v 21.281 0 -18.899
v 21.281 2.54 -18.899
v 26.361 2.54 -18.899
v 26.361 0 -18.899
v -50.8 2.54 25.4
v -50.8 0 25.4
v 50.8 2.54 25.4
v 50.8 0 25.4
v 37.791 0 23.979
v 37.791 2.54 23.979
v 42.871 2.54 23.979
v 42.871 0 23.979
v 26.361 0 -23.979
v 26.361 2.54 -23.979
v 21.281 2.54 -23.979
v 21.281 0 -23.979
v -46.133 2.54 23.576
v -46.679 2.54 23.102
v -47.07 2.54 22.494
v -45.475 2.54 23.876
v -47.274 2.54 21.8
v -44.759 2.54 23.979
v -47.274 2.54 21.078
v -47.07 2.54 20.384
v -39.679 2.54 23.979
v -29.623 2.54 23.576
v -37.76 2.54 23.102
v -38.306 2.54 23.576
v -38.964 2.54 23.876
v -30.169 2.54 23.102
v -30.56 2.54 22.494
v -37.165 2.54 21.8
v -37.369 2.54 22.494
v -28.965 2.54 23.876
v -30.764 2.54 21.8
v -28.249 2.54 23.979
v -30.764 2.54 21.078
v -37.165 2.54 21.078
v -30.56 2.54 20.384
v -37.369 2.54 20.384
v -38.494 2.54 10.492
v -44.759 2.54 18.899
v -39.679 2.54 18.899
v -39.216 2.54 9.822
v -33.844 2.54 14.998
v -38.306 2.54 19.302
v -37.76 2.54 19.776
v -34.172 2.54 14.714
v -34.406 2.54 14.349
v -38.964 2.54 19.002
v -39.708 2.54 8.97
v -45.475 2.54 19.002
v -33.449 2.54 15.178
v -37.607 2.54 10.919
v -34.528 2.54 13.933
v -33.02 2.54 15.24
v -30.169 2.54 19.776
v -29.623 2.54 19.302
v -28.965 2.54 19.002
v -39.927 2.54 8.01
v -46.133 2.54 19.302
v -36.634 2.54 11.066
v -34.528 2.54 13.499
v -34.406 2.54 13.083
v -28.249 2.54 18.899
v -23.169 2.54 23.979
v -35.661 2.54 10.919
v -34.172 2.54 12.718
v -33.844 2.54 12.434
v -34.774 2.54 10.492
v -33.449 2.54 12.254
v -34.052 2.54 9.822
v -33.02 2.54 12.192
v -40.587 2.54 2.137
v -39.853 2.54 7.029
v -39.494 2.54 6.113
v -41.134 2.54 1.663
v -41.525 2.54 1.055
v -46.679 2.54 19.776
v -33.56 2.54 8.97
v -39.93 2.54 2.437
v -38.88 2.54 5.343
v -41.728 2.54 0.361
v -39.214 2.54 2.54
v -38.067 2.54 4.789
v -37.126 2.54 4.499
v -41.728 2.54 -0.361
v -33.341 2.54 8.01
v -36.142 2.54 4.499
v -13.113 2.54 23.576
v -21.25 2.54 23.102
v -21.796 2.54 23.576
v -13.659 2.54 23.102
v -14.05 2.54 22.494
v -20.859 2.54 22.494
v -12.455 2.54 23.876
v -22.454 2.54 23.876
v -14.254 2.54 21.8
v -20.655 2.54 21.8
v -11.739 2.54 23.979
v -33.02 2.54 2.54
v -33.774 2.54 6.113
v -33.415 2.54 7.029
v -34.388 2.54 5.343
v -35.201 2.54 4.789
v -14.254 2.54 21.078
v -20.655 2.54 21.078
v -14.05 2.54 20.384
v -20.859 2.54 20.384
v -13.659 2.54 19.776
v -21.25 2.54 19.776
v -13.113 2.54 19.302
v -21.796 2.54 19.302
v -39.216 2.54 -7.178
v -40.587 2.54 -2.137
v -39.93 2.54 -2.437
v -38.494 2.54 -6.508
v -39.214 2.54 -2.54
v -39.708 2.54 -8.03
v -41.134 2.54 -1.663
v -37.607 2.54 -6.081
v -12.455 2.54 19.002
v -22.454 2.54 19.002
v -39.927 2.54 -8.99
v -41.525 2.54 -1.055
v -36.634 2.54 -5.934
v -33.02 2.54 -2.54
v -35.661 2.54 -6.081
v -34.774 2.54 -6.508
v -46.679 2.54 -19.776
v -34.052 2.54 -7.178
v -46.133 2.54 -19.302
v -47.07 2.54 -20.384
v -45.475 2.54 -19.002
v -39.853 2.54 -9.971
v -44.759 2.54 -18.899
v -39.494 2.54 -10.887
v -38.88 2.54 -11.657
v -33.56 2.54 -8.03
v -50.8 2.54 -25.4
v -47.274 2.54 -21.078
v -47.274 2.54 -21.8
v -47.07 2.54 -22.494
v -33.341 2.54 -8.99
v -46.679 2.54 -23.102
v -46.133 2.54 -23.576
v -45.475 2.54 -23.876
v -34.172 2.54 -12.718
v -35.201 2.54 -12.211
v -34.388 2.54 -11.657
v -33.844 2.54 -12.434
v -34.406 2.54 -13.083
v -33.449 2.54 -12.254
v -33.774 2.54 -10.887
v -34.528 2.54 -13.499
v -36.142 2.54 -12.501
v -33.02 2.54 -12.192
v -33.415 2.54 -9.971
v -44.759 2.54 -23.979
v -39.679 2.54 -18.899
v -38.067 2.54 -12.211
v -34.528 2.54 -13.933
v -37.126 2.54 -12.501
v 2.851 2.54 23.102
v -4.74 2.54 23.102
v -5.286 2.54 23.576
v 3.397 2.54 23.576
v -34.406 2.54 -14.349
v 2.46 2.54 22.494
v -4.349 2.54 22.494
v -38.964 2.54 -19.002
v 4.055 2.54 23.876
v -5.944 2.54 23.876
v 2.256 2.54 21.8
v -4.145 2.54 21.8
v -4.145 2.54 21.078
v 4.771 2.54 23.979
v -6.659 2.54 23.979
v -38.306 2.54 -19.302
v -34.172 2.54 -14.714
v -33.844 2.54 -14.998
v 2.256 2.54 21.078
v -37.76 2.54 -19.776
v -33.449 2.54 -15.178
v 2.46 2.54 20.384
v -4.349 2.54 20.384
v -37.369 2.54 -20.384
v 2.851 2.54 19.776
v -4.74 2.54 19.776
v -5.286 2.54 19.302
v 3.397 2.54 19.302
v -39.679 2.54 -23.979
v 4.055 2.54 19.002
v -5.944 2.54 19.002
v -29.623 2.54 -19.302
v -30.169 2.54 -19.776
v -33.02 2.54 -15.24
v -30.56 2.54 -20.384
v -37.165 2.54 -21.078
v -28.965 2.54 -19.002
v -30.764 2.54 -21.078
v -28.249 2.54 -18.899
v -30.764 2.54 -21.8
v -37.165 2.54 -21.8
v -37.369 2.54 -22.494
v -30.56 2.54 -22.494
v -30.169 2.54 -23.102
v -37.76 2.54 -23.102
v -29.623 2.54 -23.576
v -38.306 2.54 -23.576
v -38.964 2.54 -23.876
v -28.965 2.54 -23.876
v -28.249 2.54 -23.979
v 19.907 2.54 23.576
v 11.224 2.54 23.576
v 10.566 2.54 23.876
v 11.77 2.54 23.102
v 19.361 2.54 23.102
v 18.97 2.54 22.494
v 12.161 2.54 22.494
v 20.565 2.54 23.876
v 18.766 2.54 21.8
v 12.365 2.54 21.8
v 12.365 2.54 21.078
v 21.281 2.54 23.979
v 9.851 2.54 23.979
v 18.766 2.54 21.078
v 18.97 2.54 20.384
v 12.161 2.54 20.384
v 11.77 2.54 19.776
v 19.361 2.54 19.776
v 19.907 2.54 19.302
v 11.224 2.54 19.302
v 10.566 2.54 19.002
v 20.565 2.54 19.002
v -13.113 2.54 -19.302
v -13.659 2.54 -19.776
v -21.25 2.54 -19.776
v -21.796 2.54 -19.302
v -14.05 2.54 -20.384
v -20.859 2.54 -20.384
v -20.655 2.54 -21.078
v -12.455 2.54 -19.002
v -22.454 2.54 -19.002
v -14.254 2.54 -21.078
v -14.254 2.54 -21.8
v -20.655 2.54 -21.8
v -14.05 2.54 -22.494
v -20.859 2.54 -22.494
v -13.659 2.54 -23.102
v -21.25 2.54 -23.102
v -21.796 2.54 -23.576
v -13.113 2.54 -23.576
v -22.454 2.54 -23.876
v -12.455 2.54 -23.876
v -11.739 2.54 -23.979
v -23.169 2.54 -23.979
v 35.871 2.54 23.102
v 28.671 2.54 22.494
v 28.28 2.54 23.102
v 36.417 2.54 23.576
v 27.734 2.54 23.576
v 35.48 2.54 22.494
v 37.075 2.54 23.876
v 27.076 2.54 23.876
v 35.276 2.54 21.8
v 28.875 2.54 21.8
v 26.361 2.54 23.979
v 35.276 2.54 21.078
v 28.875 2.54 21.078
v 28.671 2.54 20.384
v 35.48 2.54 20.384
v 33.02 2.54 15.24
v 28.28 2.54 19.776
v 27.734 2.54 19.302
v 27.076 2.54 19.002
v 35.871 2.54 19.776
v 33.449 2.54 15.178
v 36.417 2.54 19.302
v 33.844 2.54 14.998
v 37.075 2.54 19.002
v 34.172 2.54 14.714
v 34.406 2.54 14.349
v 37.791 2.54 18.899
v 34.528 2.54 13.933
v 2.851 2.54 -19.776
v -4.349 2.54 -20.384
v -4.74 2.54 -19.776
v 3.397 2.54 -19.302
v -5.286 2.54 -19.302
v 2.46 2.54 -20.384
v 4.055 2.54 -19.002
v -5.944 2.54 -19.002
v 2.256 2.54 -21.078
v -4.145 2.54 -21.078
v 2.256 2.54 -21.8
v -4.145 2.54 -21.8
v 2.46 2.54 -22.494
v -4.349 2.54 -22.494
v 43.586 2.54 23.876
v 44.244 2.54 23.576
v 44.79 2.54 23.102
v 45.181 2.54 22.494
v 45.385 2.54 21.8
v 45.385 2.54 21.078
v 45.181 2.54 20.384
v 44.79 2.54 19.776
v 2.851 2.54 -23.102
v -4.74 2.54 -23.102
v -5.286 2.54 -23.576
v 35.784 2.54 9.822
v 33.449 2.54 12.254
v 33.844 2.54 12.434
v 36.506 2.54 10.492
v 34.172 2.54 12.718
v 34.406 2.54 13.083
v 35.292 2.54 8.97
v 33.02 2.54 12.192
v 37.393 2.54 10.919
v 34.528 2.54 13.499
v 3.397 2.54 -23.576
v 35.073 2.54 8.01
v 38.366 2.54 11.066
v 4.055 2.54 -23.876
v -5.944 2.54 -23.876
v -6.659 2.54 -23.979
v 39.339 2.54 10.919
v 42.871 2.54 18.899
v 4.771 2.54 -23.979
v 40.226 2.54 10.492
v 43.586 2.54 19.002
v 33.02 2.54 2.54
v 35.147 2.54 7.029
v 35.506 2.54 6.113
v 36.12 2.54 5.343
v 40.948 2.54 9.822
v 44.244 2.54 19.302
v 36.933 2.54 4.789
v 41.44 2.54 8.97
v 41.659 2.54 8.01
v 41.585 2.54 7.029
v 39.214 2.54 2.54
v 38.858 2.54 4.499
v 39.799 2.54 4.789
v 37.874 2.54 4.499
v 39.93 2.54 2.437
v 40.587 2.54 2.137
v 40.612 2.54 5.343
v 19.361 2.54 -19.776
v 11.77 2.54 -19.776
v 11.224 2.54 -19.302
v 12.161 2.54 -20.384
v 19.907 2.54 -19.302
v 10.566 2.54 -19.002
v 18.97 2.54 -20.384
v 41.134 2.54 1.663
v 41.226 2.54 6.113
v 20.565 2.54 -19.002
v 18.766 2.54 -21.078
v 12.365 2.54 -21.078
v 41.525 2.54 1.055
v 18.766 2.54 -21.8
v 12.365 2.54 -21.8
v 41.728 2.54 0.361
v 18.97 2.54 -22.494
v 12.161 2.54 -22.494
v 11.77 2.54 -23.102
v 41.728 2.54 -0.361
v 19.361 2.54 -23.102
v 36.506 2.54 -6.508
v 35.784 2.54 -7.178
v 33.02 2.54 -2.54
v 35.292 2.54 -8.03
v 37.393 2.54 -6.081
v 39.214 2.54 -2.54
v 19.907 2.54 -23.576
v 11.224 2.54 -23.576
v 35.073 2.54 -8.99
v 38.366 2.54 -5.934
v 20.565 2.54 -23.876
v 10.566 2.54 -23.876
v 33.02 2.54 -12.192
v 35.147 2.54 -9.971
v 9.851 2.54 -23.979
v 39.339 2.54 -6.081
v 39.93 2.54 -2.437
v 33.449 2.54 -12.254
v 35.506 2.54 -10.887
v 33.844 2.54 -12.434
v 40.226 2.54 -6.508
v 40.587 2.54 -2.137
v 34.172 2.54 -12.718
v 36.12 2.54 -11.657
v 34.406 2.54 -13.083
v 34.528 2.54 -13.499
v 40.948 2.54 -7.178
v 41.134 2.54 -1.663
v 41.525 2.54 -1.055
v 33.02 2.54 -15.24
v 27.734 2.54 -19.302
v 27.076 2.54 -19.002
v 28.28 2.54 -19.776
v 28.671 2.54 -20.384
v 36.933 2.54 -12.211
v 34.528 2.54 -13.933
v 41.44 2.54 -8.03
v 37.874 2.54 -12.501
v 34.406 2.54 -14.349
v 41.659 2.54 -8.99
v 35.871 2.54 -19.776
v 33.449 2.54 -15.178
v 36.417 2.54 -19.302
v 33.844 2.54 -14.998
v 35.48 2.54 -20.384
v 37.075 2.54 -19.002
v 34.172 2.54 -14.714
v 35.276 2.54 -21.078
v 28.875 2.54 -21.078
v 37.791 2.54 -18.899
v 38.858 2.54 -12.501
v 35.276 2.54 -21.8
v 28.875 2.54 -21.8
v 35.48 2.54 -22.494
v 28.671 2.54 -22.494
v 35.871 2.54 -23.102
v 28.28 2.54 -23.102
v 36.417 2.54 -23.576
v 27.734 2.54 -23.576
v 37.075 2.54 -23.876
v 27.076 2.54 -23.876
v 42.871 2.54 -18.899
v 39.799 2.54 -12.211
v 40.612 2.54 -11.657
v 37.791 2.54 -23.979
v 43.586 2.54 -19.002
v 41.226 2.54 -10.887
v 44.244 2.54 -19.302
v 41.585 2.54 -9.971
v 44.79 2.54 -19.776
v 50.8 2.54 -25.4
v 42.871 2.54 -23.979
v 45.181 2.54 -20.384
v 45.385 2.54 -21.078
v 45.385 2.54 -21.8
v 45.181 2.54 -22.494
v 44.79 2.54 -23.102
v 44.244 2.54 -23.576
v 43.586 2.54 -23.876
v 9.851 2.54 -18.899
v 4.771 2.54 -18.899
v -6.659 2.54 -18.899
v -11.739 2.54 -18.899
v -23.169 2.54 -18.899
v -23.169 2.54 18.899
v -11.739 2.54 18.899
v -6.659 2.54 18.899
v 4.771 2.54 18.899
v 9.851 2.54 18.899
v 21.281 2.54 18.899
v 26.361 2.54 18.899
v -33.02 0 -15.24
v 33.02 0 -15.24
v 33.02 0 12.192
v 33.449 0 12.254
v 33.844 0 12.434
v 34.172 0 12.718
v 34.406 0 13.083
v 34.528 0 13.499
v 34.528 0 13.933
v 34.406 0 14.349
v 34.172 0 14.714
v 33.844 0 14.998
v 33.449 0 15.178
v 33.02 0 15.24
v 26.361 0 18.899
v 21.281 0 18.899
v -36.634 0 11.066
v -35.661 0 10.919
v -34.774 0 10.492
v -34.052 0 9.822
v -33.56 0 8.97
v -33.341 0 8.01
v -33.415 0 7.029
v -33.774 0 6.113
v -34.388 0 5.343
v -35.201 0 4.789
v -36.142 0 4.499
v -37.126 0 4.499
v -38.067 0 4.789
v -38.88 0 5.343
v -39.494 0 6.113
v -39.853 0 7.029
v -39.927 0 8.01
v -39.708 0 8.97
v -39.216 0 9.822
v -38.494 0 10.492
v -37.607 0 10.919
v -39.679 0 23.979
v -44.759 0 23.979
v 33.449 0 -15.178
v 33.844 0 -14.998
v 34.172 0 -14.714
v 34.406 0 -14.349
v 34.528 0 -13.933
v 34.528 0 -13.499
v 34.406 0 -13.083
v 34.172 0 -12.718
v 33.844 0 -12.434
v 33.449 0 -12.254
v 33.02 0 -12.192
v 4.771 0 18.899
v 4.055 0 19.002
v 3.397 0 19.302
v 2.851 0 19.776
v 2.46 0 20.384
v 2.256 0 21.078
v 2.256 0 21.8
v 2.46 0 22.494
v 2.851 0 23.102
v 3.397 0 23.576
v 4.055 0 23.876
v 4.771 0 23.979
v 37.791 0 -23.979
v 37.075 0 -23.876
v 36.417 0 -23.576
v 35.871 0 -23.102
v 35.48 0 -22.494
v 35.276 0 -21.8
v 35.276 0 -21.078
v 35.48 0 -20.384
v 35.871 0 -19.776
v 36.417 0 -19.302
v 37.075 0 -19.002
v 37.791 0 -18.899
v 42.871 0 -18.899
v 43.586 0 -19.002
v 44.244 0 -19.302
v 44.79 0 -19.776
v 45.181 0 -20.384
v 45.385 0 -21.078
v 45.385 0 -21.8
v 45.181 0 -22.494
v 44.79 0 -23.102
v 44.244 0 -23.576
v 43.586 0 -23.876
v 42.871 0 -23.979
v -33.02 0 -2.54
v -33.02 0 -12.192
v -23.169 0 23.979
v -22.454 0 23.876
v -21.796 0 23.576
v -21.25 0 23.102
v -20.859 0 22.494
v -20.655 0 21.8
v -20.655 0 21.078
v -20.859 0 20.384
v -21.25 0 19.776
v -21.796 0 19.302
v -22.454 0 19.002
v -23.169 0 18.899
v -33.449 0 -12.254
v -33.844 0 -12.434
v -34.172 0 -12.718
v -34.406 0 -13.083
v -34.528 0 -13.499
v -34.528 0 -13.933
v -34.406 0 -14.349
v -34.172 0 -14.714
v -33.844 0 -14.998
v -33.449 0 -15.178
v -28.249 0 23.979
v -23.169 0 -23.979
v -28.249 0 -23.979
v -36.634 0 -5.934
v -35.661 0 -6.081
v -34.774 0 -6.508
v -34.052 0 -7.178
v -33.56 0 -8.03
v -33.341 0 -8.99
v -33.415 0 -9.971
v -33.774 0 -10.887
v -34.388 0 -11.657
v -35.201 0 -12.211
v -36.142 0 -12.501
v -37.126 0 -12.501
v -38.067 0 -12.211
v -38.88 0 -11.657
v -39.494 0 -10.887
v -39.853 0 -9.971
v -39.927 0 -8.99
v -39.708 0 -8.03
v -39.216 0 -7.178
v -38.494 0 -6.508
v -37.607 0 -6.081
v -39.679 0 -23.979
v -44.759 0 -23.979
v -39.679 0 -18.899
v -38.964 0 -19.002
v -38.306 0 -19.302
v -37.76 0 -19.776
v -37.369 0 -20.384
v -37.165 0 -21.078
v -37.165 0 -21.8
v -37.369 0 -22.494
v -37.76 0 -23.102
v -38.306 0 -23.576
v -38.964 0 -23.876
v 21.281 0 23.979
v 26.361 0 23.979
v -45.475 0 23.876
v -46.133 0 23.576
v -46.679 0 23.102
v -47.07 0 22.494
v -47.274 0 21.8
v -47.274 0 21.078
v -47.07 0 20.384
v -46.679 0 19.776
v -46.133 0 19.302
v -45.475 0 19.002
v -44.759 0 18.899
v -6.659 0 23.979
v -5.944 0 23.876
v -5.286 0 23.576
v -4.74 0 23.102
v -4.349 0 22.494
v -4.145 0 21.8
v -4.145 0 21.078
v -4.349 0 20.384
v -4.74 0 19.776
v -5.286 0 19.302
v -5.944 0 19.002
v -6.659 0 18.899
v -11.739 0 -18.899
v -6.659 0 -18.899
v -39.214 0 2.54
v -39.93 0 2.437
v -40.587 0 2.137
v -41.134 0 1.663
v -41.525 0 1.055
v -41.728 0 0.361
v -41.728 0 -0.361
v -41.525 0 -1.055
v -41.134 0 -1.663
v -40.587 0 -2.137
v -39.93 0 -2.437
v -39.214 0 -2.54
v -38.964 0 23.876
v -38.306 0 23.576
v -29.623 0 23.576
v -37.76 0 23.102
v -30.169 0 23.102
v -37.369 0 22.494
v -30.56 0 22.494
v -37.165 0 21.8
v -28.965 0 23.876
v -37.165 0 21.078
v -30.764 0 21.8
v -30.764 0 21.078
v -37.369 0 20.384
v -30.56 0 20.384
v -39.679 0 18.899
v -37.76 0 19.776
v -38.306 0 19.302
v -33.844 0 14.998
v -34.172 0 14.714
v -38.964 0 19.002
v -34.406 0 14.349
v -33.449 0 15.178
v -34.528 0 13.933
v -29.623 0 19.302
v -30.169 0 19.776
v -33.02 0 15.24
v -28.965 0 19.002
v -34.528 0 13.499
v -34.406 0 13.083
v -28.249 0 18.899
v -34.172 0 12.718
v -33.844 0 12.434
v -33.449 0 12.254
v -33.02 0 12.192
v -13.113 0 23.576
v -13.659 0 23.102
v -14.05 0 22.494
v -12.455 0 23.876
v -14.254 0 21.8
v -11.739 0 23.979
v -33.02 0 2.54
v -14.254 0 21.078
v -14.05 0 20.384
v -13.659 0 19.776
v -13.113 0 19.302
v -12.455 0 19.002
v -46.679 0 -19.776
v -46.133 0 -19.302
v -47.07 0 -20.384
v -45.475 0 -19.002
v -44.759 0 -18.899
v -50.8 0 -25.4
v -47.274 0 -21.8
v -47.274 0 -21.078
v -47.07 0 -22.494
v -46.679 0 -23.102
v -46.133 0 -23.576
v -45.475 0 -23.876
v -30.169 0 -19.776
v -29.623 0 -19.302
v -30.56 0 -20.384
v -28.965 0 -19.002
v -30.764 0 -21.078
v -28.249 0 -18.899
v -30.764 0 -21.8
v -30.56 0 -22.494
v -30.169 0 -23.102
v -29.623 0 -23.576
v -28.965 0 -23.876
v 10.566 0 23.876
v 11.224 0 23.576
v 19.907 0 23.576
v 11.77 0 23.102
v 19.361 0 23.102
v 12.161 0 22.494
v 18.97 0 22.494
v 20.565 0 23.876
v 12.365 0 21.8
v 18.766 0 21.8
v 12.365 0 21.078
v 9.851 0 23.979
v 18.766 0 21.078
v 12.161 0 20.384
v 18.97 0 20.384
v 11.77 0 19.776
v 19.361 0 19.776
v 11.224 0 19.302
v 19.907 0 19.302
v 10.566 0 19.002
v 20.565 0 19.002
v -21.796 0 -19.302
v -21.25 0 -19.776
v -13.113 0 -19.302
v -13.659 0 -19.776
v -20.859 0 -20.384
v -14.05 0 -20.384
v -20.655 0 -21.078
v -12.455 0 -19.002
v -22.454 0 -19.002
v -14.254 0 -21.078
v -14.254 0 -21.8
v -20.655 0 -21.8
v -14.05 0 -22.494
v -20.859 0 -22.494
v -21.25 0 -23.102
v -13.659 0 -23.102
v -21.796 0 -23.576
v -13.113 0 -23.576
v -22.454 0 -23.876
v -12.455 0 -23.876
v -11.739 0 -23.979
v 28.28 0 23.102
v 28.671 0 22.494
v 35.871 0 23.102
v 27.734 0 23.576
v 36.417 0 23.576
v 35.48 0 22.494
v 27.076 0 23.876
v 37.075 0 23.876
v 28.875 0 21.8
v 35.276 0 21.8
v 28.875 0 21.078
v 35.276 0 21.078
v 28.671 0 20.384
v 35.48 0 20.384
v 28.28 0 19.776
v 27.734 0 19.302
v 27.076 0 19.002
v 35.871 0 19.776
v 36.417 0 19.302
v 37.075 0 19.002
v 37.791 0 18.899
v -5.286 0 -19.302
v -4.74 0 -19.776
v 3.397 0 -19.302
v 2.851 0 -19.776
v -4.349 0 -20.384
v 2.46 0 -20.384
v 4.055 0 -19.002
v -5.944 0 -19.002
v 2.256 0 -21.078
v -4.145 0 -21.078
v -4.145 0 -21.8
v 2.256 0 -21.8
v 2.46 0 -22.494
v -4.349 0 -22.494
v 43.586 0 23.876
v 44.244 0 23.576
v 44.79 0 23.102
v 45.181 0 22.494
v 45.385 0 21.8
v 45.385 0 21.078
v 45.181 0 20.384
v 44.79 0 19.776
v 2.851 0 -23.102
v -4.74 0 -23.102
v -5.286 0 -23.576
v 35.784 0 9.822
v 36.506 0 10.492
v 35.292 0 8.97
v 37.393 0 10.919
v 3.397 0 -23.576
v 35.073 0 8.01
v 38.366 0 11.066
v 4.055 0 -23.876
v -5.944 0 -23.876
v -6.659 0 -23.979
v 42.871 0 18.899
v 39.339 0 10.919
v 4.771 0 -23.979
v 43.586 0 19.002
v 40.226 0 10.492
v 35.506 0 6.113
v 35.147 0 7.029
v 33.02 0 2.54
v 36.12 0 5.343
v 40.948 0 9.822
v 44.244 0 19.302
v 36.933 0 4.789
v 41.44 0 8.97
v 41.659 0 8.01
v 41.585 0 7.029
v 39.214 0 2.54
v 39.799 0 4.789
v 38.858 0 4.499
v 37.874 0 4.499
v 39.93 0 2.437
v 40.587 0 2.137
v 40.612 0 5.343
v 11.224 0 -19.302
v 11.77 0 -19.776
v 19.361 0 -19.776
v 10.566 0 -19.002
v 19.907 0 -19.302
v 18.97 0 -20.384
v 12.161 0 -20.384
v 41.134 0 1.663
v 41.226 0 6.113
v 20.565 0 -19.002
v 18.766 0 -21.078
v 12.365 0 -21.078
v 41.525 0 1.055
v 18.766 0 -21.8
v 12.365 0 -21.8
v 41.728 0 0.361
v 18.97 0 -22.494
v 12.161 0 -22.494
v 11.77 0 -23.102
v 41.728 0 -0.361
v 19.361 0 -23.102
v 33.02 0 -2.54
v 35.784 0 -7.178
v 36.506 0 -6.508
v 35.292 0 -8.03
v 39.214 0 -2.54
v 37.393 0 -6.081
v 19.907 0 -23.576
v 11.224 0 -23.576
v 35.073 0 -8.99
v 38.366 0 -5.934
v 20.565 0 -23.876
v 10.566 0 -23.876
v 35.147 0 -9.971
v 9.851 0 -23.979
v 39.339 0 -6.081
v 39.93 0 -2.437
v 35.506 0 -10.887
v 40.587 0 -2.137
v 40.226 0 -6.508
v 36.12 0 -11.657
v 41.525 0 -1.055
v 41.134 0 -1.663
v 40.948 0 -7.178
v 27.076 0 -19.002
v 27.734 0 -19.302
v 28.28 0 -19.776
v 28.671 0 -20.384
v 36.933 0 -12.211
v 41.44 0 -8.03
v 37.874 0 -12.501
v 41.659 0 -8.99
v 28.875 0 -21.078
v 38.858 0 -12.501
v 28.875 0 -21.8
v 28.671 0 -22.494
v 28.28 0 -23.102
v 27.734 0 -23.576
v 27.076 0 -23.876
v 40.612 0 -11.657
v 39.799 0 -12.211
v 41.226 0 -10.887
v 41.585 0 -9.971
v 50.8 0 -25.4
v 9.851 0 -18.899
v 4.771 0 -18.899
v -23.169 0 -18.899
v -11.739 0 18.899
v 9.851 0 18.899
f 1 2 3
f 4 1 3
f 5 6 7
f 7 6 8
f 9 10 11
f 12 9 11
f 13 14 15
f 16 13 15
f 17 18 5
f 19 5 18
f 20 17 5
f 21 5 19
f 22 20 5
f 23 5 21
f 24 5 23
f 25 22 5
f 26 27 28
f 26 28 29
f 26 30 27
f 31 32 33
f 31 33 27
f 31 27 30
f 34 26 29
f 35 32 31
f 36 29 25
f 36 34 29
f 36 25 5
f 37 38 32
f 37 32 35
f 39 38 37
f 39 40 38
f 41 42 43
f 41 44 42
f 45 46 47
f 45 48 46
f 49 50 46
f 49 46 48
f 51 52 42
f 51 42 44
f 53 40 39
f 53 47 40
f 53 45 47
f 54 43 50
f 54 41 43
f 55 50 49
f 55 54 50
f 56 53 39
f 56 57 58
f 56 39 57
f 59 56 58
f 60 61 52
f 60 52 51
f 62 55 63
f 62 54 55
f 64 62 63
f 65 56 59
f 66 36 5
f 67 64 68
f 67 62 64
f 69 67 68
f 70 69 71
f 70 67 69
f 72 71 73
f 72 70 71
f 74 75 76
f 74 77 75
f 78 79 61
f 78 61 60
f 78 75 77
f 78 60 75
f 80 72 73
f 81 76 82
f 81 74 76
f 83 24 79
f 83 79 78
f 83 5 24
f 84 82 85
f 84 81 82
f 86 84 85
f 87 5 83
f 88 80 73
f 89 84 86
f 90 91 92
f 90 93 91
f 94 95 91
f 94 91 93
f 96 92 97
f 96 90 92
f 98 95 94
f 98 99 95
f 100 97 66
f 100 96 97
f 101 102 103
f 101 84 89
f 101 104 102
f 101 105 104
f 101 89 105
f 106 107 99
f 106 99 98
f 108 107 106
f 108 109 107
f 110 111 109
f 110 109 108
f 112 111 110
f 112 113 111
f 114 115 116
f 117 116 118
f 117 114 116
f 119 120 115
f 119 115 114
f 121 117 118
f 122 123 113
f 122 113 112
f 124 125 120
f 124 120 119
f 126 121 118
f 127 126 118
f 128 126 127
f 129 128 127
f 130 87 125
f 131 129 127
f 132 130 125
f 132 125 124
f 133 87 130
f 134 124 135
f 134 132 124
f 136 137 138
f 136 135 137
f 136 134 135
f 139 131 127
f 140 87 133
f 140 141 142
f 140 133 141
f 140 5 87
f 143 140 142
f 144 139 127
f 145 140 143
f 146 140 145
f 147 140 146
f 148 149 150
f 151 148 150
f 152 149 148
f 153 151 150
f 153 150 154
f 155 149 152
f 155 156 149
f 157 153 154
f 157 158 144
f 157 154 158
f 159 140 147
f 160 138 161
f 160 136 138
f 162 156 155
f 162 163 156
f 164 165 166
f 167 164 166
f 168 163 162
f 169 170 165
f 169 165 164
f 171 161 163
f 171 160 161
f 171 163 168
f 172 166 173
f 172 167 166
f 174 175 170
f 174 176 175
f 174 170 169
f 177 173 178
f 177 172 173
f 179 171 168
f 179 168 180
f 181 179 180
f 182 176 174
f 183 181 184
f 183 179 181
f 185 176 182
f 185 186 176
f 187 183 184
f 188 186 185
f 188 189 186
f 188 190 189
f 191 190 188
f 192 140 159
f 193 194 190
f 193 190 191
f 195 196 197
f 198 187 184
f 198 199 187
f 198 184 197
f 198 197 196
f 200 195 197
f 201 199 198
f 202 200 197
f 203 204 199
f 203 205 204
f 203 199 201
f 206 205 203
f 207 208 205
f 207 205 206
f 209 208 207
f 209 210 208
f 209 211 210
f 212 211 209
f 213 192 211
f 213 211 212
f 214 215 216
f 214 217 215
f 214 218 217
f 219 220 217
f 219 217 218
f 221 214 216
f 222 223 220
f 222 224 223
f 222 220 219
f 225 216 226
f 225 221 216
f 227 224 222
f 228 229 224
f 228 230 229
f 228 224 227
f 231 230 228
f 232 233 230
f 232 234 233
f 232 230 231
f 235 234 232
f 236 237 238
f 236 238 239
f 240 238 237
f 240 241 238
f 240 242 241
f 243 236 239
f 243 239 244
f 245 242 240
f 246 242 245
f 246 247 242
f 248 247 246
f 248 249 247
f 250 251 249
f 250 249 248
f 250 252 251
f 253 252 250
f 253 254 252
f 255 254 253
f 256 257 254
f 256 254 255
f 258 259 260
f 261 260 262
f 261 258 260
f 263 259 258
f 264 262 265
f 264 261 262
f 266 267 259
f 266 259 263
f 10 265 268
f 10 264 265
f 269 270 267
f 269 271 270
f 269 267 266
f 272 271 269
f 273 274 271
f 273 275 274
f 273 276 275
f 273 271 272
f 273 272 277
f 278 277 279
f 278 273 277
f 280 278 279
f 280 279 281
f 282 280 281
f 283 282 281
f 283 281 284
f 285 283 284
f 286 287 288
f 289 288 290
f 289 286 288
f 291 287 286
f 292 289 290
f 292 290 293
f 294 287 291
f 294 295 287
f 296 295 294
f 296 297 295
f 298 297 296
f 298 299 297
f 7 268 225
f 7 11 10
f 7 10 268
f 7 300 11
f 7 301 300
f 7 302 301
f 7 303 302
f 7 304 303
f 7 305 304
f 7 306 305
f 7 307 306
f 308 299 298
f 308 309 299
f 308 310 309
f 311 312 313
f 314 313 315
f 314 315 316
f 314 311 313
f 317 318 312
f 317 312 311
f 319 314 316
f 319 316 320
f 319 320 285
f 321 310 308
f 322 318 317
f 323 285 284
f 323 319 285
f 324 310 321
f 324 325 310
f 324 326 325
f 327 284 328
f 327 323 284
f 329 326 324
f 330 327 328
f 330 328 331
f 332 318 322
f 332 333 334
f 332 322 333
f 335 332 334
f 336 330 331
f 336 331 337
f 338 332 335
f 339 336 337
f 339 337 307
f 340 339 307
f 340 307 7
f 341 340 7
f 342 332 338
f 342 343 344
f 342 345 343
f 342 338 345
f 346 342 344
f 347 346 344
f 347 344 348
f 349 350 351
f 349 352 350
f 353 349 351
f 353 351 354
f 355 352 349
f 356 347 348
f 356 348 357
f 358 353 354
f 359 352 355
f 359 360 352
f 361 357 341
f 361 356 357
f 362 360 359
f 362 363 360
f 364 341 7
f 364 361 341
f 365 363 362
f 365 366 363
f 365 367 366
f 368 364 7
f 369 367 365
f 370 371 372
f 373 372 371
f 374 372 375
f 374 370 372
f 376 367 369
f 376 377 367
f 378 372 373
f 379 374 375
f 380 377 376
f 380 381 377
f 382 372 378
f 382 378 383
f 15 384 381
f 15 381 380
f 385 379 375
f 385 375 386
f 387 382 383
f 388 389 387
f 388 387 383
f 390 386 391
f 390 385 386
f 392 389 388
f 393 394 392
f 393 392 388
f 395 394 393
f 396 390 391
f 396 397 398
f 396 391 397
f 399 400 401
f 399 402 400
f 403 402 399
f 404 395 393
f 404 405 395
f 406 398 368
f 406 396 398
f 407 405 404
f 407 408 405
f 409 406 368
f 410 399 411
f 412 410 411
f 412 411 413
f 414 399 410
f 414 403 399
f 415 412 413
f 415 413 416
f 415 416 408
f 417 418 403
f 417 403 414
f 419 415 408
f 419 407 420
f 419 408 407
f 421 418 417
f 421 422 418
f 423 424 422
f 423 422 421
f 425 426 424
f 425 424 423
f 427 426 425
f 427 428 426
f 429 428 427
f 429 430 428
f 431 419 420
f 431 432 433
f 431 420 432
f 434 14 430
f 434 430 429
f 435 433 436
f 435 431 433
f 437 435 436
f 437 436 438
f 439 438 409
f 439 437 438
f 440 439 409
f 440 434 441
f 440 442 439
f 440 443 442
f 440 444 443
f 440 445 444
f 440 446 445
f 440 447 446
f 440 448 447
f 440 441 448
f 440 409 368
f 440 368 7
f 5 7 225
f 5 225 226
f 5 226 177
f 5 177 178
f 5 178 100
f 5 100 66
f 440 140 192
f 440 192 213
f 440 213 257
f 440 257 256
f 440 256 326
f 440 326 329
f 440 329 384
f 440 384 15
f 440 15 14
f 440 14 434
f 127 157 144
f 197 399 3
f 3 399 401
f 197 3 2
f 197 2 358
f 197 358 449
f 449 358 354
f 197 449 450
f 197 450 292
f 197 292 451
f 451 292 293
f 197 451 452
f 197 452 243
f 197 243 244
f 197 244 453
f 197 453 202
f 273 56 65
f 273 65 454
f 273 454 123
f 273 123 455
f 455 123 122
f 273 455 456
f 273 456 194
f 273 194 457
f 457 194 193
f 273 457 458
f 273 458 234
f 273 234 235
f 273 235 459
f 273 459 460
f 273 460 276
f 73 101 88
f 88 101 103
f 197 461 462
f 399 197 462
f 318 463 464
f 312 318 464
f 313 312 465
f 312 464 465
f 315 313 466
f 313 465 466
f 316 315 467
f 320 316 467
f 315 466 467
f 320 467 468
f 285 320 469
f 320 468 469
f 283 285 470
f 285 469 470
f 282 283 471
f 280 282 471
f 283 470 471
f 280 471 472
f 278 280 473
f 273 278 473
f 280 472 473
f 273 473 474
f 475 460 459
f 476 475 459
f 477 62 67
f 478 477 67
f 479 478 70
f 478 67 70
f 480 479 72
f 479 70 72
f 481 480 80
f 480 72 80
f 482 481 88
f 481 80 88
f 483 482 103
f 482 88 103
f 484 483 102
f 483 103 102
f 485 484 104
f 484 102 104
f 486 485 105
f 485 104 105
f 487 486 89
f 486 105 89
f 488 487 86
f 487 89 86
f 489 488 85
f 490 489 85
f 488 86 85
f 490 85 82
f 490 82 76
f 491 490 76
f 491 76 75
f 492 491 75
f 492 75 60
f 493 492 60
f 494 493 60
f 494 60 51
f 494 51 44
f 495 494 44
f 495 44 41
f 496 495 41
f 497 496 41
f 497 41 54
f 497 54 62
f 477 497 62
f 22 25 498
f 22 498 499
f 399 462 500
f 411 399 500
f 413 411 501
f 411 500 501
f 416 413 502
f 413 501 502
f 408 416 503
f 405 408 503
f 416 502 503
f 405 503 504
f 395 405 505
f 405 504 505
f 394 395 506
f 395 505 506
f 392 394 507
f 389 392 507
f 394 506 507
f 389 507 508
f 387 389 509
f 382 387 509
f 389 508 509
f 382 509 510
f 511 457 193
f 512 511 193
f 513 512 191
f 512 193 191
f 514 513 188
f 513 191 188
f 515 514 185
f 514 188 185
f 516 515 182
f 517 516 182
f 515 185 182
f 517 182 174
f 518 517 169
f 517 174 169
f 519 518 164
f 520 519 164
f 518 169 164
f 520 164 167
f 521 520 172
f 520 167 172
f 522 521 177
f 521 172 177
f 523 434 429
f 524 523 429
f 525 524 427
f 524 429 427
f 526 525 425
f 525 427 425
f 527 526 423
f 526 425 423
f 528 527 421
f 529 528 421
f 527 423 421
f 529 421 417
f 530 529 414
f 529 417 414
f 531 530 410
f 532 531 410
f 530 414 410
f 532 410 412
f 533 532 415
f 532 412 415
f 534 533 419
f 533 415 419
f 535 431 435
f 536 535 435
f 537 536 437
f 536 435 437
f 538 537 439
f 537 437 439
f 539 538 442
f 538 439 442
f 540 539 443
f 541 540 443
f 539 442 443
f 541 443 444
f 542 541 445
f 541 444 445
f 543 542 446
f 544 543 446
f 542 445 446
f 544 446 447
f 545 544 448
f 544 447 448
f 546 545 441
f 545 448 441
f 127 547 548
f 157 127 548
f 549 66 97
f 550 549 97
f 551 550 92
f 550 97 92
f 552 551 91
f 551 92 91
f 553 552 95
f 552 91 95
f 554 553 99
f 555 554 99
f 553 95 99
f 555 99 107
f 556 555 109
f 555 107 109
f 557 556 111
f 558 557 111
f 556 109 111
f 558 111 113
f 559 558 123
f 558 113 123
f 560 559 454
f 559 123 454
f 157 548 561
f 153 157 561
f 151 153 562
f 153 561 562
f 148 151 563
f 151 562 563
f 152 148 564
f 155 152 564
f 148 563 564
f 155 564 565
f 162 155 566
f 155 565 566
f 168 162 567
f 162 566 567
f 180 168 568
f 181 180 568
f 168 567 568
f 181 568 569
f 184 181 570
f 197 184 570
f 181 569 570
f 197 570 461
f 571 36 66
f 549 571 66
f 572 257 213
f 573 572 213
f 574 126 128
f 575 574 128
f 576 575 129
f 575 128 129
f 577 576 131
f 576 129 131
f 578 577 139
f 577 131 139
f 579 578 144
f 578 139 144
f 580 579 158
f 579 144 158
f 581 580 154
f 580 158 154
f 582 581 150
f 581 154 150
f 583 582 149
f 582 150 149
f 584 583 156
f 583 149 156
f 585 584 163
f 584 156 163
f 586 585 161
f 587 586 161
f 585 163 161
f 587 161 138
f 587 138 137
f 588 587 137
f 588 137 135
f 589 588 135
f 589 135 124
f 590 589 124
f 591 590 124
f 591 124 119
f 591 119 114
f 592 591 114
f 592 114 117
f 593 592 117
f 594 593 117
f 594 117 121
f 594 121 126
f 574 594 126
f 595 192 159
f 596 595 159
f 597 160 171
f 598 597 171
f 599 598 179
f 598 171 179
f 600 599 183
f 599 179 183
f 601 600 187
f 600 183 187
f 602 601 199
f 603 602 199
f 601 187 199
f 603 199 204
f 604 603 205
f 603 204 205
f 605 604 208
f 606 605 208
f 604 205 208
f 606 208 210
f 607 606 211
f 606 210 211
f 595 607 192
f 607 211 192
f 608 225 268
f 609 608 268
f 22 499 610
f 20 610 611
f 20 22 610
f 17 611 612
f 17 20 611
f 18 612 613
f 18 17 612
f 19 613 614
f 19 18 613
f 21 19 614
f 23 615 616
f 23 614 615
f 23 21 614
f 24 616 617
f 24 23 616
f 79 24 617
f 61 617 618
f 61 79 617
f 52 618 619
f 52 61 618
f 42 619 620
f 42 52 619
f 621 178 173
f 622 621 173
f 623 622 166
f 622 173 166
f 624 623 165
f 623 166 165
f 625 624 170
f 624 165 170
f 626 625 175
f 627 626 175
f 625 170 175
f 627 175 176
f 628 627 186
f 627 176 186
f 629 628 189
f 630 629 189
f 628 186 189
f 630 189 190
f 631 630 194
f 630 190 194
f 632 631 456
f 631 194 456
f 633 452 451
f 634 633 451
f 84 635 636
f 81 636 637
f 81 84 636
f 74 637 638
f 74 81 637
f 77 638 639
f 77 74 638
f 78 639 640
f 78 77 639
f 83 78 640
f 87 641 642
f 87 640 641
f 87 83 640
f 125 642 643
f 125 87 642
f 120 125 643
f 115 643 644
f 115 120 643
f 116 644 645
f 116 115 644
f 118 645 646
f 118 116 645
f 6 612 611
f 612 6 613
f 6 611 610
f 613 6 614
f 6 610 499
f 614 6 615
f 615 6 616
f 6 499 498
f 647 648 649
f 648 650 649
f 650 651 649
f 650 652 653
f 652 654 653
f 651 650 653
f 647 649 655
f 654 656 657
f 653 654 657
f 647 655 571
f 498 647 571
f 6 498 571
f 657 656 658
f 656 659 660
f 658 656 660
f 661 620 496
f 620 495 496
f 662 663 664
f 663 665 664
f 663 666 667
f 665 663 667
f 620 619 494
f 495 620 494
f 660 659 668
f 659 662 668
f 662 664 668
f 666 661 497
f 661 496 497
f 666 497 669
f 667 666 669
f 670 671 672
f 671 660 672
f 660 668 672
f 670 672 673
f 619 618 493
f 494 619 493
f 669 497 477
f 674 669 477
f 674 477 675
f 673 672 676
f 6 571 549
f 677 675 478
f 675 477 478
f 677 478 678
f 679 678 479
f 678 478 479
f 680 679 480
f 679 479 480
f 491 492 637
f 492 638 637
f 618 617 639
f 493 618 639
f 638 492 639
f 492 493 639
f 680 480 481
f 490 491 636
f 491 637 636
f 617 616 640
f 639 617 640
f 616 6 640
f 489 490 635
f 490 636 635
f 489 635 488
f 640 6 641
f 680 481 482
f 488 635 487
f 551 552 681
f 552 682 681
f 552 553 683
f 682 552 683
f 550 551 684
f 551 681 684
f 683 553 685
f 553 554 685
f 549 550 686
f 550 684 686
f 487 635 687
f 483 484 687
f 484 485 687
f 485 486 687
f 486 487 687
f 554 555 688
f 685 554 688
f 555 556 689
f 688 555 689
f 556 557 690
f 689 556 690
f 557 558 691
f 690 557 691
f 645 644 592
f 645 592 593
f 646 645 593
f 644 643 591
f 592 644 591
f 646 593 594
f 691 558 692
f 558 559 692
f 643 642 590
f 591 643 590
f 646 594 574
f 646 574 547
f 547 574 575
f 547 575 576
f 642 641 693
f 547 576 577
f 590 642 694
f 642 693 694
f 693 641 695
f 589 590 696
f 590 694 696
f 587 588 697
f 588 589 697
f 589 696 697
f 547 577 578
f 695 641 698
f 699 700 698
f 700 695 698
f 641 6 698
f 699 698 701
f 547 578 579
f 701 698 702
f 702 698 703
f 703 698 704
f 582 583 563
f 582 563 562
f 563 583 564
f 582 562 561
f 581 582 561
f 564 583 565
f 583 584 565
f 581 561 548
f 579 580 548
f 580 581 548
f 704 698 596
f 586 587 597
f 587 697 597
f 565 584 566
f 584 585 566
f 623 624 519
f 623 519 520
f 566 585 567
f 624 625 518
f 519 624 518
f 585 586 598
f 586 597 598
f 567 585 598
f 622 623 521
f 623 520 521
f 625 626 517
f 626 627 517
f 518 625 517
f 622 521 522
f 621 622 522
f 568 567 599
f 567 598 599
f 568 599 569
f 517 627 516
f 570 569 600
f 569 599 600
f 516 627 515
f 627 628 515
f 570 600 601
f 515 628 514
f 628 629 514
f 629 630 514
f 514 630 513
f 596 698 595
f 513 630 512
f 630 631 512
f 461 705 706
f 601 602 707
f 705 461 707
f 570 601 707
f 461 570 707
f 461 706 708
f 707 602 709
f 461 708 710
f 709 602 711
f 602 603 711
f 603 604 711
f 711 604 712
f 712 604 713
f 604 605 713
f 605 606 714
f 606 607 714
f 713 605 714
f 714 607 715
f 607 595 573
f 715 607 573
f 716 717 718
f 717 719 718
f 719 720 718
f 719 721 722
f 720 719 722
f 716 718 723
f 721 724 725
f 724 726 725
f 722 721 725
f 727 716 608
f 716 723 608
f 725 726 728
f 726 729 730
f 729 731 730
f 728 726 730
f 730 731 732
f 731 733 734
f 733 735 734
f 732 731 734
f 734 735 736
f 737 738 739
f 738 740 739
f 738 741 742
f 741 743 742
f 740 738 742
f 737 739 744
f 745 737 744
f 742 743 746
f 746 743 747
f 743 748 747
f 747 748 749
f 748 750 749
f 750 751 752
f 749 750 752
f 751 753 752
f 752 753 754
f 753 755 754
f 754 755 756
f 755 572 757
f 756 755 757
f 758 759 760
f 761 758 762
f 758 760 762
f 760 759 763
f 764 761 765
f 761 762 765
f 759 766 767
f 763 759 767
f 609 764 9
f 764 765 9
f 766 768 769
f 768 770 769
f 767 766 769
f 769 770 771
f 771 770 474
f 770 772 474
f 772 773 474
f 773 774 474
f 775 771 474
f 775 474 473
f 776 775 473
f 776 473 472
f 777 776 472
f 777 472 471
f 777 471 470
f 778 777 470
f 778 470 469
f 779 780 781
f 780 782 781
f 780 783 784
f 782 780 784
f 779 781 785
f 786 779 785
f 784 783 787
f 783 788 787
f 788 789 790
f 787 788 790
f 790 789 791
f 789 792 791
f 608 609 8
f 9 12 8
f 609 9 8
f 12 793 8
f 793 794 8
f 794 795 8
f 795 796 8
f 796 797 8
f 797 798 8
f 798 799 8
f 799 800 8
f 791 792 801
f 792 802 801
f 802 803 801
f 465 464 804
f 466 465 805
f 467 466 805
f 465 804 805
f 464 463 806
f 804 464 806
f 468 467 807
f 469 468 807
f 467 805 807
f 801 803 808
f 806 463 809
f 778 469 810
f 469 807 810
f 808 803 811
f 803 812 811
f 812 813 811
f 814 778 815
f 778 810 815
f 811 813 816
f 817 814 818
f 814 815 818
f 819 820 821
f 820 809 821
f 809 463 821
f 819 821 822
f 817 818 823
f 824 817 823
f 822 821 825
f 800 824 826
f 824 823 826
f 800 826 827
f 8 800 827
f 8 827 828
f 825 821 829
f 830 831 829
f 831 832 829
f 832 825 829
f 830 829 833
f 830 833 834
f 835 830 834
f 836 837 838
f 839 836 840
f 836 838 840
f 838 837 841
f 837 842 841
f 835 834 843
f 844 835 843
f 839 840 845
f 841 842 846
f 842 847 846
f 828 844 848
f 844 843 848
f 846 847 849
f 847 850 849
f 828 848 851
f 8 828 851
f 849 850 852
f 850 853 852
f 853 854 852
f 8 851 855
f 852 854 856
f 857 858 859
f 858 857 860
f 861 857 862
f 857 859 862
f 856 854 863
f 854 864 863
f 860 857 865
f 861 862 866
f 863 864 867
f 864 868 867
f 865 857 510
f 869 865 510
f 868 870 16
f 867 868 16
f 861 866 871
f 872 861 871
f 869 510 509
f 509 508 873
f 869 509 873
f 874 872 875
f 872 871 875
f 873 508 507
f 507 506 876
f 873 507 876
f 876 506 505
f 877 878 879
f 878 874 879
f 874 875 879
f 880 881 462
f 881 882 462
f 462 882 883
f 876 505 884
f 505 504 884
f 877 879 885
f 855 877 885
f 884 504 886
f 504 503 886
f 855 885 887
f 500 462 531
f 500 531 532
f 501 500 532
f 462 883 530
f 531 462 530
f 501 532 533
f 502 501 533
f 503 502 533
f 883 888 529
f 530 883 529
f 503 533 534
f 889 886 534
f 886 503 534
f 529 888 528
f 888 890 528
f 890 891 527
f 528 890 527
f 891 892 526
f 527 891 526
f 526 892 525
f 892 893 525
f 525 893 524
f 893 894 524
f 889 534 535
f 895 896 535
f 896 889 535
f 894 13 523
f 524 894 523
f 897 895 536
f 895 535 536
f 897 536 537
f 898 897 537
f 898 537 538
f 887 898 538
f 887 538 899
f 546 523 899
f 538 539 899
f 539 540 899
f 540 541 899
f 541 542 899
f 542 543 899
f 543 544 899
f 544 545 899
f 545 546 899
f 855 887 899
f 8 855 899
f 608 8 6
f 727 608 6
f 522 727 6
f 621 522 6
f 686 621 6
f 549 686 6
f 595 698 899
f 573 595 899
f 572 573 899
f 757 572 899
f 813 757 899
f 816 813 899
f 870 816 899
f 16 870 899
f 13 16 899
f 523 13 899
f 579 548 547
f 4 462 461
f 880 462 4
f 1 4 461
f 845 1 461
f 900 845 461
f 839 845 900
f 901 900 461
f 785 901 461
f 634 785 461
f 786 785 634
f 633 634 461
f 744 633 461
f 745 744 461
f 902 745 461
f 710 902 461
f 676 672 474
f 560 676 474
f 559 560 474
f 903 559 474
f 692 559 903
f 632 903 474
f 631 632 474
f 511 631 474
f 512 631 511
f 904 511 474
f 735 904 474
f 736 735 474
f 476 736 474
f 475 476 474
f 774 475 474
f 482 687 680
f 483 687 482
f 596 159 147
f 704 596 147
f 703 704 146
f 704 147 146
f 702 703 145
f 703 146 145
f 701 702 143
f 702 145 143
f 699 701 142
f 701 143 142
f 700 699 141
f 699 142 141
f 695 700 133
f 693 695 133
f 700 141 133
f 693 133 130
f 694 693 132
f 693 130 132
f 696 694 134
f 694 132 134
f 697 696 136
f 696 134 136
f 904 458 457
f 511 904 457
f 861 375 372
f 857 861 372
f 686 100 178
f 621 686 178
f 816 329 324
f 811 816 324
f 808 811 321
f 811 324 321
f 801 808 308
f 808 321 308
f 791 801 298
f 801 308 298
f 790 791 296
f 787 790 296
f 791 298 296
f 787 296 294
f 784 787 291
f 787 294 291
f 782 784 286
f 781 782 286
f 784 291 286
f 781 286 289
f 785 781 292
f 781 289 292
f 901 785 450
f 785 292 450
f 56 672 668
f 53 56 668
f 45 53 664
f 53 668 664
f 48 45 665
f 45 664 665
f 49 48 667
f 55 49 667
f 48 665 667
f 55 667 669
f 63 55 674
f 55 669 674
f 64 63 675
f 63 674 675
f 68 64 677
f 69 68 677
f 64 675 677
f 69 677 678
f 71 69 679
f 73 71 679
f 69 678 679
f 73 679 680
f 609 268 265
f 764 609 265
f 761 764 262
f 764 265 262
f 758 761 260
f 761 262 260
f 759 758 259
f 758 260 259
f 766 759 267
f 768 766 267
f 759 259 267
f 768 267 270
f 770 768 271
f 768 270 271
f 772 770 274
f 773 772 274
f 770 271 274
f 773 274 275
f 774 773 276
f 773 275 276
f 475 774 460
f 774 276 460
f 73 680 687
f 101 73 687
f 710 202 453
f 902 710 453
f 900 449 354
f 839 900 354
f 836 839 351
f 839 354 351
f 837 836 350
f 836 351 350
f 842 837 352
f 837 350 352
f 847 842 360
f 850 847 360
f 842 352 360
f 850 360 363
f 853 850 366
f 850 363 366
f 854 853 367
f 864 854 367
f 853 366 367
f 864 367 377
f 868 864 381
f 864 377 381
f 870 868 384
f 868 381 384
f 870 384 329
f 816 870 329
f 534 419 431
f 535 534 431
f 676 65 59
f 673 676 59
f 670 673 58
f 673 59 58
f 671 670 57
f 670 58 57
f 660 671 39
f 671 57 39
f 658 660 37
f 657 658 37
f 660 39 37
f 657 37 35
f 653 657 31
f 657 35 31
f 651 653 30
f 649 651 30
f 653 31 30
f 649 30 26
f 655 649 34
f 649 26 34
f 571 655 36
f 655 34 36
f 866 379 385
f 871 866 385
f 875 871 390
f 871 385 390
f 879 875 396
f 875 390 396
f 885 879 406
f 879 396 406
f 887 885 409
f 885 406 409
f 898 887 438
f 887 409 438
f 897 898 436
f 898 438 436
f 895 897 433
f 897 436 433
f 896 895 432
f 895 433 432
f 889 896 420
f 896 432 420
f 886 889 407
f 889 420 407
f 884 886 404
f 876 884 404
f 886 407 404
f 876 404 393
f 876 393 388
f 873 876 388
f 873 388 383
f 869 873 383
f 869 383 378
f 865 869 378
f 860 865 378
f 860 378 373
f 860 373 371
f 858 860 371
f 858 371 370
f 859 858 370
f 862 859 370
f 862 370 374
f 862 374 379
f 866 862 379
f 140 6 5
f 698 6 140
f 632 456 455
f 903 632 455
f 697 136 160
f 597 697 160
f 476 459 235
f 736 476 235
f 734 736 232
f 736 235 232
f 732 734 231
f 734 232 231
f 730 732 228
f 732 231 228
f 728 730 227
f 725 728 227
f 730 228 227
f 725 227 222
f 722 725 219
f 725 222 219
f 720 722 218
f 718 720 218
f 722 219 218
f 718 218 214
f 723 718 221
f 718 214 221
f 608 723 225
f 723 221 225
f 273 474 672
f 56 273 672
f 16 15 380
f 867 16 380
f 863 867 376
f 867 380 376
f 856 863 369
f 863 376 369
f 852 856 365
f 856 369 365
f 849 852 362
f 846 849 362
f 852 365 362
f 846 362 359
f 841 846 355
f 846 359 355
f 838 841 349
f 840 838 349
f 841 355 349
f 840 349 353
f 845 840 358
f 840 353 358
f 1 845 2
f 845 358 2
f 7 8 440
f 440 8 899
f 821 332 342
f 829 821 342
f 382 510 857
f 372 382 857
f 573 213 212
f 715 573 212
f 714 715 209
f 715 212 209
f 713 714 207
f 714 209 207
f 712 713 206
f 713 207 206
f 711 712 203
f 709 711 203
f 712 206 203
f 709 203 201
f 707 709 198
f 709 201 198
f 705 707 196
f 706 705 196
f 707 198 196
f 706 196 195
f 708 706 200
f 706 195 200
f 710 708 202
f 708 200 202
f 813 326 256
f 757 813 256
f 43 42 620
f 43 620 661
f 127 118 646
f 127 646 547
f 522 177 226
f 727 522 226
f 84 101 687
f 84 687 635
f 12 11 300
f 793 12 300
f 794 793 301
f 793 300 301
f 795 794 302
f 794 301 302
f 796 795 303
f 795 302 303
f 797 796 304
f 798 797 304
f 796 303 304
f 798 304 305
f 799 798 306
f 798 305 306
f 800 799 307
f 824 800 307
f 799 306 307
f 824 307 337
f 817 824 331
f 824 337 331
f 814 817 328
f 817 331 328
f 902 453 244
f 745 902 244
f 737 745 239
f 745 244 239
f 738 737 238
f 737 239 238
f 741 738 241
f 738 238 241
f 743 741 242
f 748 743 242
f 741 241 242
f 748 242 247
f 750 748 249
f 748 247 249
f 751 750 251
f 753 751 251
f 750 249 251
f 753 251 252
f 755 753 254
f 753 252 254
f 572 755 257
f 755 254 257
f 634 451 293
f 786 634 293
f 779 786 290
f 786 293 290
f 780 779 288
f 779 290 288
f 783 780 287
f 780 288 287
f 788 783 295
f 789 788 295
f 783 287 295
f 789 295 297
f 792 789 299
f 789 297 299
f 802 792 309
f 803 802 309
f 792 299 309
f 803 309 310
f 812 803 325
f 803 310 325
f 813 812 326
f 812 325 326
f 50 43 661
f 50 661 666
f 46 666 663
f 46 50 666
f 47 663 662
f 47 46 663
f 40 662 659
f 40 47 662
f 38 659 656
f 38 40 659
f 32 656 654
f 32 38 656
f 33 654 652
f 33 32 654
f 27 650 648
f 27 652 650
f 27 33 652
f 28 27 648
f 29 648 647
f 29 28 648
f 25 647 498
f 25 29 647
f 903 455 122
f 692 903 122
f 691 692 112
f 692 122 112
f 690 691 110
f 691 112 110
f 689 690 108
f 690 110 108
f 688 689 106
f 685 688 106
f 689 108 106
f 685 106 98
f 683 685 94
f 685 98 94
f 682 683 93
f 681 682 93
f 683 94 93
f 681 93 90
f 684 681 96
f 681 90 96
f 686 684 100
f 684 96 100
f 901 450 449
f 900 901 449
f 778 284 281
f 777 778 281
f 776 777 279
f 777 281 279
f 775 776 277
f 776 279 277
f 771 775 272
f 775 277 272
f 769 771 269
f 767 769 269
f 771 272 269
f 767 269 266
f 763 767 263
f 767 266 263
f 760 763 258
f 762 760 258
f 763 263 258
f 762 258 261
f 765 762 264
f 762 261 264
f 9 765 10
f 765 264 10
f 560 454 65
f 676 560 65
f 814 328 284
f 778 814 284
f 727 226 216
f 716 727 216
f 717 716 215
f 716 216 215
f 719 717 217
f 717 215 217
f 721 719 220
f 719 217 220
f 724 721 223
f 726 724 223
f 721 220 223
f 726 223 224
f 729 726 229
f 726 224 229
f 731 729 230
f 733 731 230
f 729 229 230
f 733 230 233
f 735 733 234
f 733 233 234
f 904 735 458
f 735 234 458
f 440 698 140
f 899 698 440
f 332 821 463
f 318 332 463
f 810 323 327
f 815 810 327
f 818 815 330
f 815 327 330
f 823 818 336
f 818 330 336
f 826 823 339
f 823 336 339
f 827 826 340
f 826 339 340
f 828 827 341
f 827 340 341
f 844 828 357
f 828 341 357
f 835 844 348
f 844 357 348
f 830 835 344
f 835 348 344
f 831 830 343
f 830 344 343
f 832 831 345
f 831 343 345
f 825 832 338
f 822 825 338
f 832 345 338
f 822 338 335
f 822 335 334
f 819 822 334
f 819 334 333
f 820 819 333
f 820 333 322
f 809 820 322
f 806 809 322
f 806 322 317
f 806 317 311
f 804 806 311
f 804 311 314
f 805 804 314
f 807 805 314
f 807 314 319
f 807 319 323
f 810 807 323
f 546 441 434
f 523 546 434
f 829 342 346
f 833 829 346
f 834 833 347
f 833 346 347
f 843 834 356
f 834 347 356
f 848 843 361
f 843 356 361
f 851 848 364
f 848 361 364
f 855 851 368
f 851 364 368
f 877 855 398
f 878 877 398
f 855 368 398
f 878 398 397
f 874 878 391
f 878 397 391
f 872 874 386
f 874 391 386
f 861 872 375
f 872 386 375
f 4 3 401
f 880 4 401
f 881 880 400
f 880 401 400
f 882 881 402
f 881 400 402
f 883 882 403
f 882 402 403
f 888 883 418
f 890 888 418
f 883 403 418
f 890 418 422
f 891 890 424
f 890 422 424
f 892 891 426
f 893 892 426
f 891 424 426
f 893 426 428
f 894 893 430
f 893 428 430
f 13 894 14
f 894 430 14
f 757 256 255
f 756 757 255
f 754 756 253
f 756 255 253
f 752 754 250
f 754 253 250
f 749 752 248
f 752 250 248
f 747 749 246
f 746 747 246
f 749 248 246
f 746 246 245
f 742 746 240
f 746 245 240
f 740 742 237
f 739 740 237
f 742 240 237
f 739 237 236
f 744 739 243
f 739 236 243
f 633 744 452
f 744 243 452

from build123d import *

# Parameters (mm, degrees)
SKETCH1_W           = 101.6
SKETCH1_H           = 50.8
BOSS_EXTRUDE1_DEPTH = 2.54
CUT_EXTRUDE1_DEPTH  = 57.852894385
CUT_EXTRUDE2_DEPTH  = 57.852894385
SKETCH4_R           = 3.302
CUT_EXTRUDE3_DEPTH  = 57.852894385


with BuildPart() as part:
    # Sketch1 → Boss-Extrude1 (new body)
    with BuildSketch(Plane(origin=(0, 0, 0), x_dir=(1, 0, 0), z_dir=(0, 1, 0))):
        Rectangle(SKETCH1_W, SKETCH1_H)
        with BuildLine():
            Line((-33.02, 15.24), (33.02, 15.24))
            ThreePointArc((33.02, 15.24), (34.544, 13.716), (33.02, 12.192))
            Line((33.02, 12.192), (33.02, -12.192))
            ThreePointArc((33.02, -12.192), (34.544, -13.716), (33.02, -15.24))
            Line((33.02, -15.24), (-33.02, -15.24))
            ThreePointArc((-33.02, -15.24), (-34.544, -13.716), (-33.02, -12.192))
            Line((-33.02, -12.192), (-33.02, 12.192))
            ThreePointArc((-33.02, 12.192), (-34.544, 13.716), (-33.02, 15.24))
        make_face(mode=Mode.SUBTRACT)
    extrude(amount=BOSS_EXTRUDE1_DEPTH)

    # Sketch2 → Cut-Extrude1 (cut, through all)
    with BuildSketch(Plane(origin=(0, 2.54, 0), x_dir=(1, 0, 0), z_dir=(0, 1, 0))):
        with BuildLine():
            Line((-44.759454191, -18.898986355), (-39.679454191, -18.898986355))
            ThreePointArc((-39.679454191, -18.898986355), (-37.139454191, -21.438986355), (-39.679454191, -23.978986355))
            Line((-39.679454191, -23.978986355), (-44.759454191, -23.978986355))
            ThreePointArc((-44.759454191, -23.978986355), (-47.299454191, -21.438986355), (-44.759454191, -18.898986355))
        make_face()
        with BuildLine():
            Line((-28.249454191, -23.978986355), (-23.169454191, -23.978986355))
            ThreePointArc((-23.169454191, -23.978986355), (-20.629454191, -21.438986355), (-23.169454191, -18.898986355))
            Line((-23.169454191, -18.898986355), (-28.249454191, -18.898986355))
            ThreePointArc((-28.249454191, -18.898986355), (-30.789454191, -21.438986355), (-28.249454191, -23.978986355))
        make_face()
        with BuildLine():
            Line((-11.739454191, -23.978986355), (-6.659454191, -23.978986355))
            ThreePointArc((-6.659454191, -23.978986355), (-4.119454191, -21.438986355), (-6.659454191, -18.898986355))
            Line((-6.659454191, -18.898986355), (-11.739454191, -18.898986355))
            ThreePointArc((-11.739454191, -18.898986355), (-14.279454191, -21.438986355), (-11.739454191, -23.978986355))
        make_face()
        with BuildLine():
            Line((4.770545809, -23.978986355), (9.850545809, -23.978986355))
            ThreePointArc((9.850545809, -23.978986355), (12.390545809, -21.438986355), (9.850545809, -18.898986355))
            Line((9.850545809, -18.898986355), (4.770545809, -18.898986355))
            ThreePointArc((4.770545809, -18.898986355), (2.230545809, -21.438986355), (4.770545809, -23.978986355))
        make_face()
        with BuildLine():
            Line((21.280545809, -23.978986355), (26.360545809, -23.978986355))
            ThreePointArc((26.360545809, -23.978986355), (28.900545809, -21.438986355), (26.360545809, -18.898986355))
            Line((26.360545809, -18.898986355), (21.280545809, -18.898986355))
            ThreePointArc((21.280545809, -18.898986355), (18.740545809, -21.438986355), (21.280545809, -23.978986355))
        make_face()
        with BuildLine():
            Line((37.790545809, -23.978986355), (42.870545809, -23.978986355))
            ThreePointArc((42.870545809, -23.978986355), (45.410545809, -21.438986355), (42.870545809, -18.898986355))
            Line((42.870545809, -18.898986355), (37.790545809, -18.898986355))
            ThreePointArc((37.790545809, -18.898986355), (35.250545809, -21.438986355), (37.790545809, -23.978986355))
        make_face()
        with BuildLine():
            Line((-28.249454191, 18.898986355), (-23.169454191, 18.898986355))
            ThreePointArc((-23.169454191, 18.898986355), (-20.629454191, 21.438986355), (-23.169454191, 23.978986355))
            Line((-23.169454191, 23.978986355), (-28.249454191, 23.978986355))
            ThreePointArc((-28.249454191, 23.978986355), (-30.789454191, 21.438986355), (-28.249454191, 18.898986355))
        make_face()
        with BuildLine():
            Line((37.790545809, 18.898986355), (42.870545809, 18.898986355))
            ThreePointArc((42.870545809, 18.898986355), (45.410545809, 21.438986355), (42.870545809, 23.978986355))
            Line((42.870545809, 23.978986355), (37.790545809, 23.978986355))
            ThreePointArc((37.790545809, 23.978986355), (35.250545809, 21.438986355), (37.790545809, 18.898986355))
        make_face()
        with BuildLine():
            Line((21.280545809, 18.898986355), (26.360545809, 18.898986355))
            ThreePointArc((26.360545809, 18.898986355), (28.900545809, 21.438986355), (26.360545809, 23.978986355))
            Line((26.360545809, 23.978986355), (21.280545809, 23.978986355))
            ThreePointArc((21.280545809, 23.978986355), (18.740545809, 21.438986355), (21.280545809, 18.898986355))
        make_face()
        with BuildLine():
            Line((4.770545809, 18.898986355), (9.850545809, 18.898986355))
            ThreePointArc((9.850545809, 18.898986355), (12.390545809, 21.438986355), (9.850545809, 23.978986355))
            Line((9.850545809, 23.978986355), (4.770545809, 23.978986355))
            ThreePointArc((4.770545809, 23.978986355), (2.230545809, 21.438986355), (4.770545809, 18.898986355))
        make_face()
        with BuildLine():
            Line((-11.739454191, 18.898986355), (-6.659454191, 18.898986355))
            ThreePointArc((-6.659454191, 18.898986355), (-4.119454191, 21.438986355), (-6.659454191, 23.978986355))
            Line((-6.659454191, 23.978986355), (-11.739454191, 23.978986355))
            ThreePointArc((-11.739454191, 23.978986355), (-14.279454191, 21.438986355), (-11.739454191, 18.898986355))
        make_face()
        with BuildLine():
            Line((-44.759454191, 18.898986355), (-39.679454191, 18.898986355))
            ThreePointArc((-39.679454191, 18.898986355), (-37.139454191, 21.438986355), (-39.679454191, 23.978986355))
            Line((-39.679454191, 23.978986355), (-44.759454191, 23.978986355))
            ThreePointArc((-44.759454191, 23.978986355), (-47.299454191, 21.438986355), (-44.759454191, 18.898986355))
        make_face()
    extrude(amount=-CUT_EXTRUDE1_DEPTH, mode=Mode.SUBTRACT)

    # Sketch3 → Cut-Extrude2 (cut, through all)
    with BuildSketch(Plane(origin=(0, 2.54, 0), x_dir=(1, 0, 0), z_dir=(0, 1, 0))):
        with BuildLine():
            Line((-33.02, -2.54), (-39.214035088, -2.54))
            ThreePointArc((-39.214035088, -2.54), (-41.754035088, 0), (-39.214035088, 2.54))
            Line((-39.214035088, 2.54), (-33.02, 2.54))
            ThreePointArc((-33.02, 2.54), (-30.48, 0), (-33.02, -2.54))
        make_face()
        with BuildLine():
            Line((33.02, -2.54), (39.214035088, -2.54))
            ThreePointArc((39.214035088, -2.54), (41.754035088, 0), (39.214035088, 2.54))
            Line((39.214035088, 2.54), (33.02, 2.54))
            ThreePointArc((33.02, 2.54), (30.48, 0), (33.02, -2.54))
        make_face()
    extrude(amount=-CUT_EXTRUDE2_DEPTH, mode=Mode.SUBTRACT)

    # Sketch4 → Cut-Extrude3 (cut, through all)
    with BuildSketch(Plane(origin=(0, 2.54, 0), x_dir=(1, 0, 0), z_dir=(0, 1, 0))):
        with Locations(Location((-36.633918246, -7.763735779, 0), (0, 0, 270))):
            Circle(SKETCH4_R)
        with Locations(Location((-36.633918246, 9.236264221, 0), (0, 0, 270))):
            Circle(SKETCH4_R)
        with Locations(Location((38.366081754, -7.763735779, 0), (0, 0, 270))):
            Circle(SKETCH4_R)
        with Locations(Location((38.366081754, 9.236264221, 0), (0, 0, 270))):
            Circle(SKETCH4_R)
    extrude(amount=-CUT_EXTRUDE3_DEPTH, mode=Mode.SUBTRACT)


solid = part.part
